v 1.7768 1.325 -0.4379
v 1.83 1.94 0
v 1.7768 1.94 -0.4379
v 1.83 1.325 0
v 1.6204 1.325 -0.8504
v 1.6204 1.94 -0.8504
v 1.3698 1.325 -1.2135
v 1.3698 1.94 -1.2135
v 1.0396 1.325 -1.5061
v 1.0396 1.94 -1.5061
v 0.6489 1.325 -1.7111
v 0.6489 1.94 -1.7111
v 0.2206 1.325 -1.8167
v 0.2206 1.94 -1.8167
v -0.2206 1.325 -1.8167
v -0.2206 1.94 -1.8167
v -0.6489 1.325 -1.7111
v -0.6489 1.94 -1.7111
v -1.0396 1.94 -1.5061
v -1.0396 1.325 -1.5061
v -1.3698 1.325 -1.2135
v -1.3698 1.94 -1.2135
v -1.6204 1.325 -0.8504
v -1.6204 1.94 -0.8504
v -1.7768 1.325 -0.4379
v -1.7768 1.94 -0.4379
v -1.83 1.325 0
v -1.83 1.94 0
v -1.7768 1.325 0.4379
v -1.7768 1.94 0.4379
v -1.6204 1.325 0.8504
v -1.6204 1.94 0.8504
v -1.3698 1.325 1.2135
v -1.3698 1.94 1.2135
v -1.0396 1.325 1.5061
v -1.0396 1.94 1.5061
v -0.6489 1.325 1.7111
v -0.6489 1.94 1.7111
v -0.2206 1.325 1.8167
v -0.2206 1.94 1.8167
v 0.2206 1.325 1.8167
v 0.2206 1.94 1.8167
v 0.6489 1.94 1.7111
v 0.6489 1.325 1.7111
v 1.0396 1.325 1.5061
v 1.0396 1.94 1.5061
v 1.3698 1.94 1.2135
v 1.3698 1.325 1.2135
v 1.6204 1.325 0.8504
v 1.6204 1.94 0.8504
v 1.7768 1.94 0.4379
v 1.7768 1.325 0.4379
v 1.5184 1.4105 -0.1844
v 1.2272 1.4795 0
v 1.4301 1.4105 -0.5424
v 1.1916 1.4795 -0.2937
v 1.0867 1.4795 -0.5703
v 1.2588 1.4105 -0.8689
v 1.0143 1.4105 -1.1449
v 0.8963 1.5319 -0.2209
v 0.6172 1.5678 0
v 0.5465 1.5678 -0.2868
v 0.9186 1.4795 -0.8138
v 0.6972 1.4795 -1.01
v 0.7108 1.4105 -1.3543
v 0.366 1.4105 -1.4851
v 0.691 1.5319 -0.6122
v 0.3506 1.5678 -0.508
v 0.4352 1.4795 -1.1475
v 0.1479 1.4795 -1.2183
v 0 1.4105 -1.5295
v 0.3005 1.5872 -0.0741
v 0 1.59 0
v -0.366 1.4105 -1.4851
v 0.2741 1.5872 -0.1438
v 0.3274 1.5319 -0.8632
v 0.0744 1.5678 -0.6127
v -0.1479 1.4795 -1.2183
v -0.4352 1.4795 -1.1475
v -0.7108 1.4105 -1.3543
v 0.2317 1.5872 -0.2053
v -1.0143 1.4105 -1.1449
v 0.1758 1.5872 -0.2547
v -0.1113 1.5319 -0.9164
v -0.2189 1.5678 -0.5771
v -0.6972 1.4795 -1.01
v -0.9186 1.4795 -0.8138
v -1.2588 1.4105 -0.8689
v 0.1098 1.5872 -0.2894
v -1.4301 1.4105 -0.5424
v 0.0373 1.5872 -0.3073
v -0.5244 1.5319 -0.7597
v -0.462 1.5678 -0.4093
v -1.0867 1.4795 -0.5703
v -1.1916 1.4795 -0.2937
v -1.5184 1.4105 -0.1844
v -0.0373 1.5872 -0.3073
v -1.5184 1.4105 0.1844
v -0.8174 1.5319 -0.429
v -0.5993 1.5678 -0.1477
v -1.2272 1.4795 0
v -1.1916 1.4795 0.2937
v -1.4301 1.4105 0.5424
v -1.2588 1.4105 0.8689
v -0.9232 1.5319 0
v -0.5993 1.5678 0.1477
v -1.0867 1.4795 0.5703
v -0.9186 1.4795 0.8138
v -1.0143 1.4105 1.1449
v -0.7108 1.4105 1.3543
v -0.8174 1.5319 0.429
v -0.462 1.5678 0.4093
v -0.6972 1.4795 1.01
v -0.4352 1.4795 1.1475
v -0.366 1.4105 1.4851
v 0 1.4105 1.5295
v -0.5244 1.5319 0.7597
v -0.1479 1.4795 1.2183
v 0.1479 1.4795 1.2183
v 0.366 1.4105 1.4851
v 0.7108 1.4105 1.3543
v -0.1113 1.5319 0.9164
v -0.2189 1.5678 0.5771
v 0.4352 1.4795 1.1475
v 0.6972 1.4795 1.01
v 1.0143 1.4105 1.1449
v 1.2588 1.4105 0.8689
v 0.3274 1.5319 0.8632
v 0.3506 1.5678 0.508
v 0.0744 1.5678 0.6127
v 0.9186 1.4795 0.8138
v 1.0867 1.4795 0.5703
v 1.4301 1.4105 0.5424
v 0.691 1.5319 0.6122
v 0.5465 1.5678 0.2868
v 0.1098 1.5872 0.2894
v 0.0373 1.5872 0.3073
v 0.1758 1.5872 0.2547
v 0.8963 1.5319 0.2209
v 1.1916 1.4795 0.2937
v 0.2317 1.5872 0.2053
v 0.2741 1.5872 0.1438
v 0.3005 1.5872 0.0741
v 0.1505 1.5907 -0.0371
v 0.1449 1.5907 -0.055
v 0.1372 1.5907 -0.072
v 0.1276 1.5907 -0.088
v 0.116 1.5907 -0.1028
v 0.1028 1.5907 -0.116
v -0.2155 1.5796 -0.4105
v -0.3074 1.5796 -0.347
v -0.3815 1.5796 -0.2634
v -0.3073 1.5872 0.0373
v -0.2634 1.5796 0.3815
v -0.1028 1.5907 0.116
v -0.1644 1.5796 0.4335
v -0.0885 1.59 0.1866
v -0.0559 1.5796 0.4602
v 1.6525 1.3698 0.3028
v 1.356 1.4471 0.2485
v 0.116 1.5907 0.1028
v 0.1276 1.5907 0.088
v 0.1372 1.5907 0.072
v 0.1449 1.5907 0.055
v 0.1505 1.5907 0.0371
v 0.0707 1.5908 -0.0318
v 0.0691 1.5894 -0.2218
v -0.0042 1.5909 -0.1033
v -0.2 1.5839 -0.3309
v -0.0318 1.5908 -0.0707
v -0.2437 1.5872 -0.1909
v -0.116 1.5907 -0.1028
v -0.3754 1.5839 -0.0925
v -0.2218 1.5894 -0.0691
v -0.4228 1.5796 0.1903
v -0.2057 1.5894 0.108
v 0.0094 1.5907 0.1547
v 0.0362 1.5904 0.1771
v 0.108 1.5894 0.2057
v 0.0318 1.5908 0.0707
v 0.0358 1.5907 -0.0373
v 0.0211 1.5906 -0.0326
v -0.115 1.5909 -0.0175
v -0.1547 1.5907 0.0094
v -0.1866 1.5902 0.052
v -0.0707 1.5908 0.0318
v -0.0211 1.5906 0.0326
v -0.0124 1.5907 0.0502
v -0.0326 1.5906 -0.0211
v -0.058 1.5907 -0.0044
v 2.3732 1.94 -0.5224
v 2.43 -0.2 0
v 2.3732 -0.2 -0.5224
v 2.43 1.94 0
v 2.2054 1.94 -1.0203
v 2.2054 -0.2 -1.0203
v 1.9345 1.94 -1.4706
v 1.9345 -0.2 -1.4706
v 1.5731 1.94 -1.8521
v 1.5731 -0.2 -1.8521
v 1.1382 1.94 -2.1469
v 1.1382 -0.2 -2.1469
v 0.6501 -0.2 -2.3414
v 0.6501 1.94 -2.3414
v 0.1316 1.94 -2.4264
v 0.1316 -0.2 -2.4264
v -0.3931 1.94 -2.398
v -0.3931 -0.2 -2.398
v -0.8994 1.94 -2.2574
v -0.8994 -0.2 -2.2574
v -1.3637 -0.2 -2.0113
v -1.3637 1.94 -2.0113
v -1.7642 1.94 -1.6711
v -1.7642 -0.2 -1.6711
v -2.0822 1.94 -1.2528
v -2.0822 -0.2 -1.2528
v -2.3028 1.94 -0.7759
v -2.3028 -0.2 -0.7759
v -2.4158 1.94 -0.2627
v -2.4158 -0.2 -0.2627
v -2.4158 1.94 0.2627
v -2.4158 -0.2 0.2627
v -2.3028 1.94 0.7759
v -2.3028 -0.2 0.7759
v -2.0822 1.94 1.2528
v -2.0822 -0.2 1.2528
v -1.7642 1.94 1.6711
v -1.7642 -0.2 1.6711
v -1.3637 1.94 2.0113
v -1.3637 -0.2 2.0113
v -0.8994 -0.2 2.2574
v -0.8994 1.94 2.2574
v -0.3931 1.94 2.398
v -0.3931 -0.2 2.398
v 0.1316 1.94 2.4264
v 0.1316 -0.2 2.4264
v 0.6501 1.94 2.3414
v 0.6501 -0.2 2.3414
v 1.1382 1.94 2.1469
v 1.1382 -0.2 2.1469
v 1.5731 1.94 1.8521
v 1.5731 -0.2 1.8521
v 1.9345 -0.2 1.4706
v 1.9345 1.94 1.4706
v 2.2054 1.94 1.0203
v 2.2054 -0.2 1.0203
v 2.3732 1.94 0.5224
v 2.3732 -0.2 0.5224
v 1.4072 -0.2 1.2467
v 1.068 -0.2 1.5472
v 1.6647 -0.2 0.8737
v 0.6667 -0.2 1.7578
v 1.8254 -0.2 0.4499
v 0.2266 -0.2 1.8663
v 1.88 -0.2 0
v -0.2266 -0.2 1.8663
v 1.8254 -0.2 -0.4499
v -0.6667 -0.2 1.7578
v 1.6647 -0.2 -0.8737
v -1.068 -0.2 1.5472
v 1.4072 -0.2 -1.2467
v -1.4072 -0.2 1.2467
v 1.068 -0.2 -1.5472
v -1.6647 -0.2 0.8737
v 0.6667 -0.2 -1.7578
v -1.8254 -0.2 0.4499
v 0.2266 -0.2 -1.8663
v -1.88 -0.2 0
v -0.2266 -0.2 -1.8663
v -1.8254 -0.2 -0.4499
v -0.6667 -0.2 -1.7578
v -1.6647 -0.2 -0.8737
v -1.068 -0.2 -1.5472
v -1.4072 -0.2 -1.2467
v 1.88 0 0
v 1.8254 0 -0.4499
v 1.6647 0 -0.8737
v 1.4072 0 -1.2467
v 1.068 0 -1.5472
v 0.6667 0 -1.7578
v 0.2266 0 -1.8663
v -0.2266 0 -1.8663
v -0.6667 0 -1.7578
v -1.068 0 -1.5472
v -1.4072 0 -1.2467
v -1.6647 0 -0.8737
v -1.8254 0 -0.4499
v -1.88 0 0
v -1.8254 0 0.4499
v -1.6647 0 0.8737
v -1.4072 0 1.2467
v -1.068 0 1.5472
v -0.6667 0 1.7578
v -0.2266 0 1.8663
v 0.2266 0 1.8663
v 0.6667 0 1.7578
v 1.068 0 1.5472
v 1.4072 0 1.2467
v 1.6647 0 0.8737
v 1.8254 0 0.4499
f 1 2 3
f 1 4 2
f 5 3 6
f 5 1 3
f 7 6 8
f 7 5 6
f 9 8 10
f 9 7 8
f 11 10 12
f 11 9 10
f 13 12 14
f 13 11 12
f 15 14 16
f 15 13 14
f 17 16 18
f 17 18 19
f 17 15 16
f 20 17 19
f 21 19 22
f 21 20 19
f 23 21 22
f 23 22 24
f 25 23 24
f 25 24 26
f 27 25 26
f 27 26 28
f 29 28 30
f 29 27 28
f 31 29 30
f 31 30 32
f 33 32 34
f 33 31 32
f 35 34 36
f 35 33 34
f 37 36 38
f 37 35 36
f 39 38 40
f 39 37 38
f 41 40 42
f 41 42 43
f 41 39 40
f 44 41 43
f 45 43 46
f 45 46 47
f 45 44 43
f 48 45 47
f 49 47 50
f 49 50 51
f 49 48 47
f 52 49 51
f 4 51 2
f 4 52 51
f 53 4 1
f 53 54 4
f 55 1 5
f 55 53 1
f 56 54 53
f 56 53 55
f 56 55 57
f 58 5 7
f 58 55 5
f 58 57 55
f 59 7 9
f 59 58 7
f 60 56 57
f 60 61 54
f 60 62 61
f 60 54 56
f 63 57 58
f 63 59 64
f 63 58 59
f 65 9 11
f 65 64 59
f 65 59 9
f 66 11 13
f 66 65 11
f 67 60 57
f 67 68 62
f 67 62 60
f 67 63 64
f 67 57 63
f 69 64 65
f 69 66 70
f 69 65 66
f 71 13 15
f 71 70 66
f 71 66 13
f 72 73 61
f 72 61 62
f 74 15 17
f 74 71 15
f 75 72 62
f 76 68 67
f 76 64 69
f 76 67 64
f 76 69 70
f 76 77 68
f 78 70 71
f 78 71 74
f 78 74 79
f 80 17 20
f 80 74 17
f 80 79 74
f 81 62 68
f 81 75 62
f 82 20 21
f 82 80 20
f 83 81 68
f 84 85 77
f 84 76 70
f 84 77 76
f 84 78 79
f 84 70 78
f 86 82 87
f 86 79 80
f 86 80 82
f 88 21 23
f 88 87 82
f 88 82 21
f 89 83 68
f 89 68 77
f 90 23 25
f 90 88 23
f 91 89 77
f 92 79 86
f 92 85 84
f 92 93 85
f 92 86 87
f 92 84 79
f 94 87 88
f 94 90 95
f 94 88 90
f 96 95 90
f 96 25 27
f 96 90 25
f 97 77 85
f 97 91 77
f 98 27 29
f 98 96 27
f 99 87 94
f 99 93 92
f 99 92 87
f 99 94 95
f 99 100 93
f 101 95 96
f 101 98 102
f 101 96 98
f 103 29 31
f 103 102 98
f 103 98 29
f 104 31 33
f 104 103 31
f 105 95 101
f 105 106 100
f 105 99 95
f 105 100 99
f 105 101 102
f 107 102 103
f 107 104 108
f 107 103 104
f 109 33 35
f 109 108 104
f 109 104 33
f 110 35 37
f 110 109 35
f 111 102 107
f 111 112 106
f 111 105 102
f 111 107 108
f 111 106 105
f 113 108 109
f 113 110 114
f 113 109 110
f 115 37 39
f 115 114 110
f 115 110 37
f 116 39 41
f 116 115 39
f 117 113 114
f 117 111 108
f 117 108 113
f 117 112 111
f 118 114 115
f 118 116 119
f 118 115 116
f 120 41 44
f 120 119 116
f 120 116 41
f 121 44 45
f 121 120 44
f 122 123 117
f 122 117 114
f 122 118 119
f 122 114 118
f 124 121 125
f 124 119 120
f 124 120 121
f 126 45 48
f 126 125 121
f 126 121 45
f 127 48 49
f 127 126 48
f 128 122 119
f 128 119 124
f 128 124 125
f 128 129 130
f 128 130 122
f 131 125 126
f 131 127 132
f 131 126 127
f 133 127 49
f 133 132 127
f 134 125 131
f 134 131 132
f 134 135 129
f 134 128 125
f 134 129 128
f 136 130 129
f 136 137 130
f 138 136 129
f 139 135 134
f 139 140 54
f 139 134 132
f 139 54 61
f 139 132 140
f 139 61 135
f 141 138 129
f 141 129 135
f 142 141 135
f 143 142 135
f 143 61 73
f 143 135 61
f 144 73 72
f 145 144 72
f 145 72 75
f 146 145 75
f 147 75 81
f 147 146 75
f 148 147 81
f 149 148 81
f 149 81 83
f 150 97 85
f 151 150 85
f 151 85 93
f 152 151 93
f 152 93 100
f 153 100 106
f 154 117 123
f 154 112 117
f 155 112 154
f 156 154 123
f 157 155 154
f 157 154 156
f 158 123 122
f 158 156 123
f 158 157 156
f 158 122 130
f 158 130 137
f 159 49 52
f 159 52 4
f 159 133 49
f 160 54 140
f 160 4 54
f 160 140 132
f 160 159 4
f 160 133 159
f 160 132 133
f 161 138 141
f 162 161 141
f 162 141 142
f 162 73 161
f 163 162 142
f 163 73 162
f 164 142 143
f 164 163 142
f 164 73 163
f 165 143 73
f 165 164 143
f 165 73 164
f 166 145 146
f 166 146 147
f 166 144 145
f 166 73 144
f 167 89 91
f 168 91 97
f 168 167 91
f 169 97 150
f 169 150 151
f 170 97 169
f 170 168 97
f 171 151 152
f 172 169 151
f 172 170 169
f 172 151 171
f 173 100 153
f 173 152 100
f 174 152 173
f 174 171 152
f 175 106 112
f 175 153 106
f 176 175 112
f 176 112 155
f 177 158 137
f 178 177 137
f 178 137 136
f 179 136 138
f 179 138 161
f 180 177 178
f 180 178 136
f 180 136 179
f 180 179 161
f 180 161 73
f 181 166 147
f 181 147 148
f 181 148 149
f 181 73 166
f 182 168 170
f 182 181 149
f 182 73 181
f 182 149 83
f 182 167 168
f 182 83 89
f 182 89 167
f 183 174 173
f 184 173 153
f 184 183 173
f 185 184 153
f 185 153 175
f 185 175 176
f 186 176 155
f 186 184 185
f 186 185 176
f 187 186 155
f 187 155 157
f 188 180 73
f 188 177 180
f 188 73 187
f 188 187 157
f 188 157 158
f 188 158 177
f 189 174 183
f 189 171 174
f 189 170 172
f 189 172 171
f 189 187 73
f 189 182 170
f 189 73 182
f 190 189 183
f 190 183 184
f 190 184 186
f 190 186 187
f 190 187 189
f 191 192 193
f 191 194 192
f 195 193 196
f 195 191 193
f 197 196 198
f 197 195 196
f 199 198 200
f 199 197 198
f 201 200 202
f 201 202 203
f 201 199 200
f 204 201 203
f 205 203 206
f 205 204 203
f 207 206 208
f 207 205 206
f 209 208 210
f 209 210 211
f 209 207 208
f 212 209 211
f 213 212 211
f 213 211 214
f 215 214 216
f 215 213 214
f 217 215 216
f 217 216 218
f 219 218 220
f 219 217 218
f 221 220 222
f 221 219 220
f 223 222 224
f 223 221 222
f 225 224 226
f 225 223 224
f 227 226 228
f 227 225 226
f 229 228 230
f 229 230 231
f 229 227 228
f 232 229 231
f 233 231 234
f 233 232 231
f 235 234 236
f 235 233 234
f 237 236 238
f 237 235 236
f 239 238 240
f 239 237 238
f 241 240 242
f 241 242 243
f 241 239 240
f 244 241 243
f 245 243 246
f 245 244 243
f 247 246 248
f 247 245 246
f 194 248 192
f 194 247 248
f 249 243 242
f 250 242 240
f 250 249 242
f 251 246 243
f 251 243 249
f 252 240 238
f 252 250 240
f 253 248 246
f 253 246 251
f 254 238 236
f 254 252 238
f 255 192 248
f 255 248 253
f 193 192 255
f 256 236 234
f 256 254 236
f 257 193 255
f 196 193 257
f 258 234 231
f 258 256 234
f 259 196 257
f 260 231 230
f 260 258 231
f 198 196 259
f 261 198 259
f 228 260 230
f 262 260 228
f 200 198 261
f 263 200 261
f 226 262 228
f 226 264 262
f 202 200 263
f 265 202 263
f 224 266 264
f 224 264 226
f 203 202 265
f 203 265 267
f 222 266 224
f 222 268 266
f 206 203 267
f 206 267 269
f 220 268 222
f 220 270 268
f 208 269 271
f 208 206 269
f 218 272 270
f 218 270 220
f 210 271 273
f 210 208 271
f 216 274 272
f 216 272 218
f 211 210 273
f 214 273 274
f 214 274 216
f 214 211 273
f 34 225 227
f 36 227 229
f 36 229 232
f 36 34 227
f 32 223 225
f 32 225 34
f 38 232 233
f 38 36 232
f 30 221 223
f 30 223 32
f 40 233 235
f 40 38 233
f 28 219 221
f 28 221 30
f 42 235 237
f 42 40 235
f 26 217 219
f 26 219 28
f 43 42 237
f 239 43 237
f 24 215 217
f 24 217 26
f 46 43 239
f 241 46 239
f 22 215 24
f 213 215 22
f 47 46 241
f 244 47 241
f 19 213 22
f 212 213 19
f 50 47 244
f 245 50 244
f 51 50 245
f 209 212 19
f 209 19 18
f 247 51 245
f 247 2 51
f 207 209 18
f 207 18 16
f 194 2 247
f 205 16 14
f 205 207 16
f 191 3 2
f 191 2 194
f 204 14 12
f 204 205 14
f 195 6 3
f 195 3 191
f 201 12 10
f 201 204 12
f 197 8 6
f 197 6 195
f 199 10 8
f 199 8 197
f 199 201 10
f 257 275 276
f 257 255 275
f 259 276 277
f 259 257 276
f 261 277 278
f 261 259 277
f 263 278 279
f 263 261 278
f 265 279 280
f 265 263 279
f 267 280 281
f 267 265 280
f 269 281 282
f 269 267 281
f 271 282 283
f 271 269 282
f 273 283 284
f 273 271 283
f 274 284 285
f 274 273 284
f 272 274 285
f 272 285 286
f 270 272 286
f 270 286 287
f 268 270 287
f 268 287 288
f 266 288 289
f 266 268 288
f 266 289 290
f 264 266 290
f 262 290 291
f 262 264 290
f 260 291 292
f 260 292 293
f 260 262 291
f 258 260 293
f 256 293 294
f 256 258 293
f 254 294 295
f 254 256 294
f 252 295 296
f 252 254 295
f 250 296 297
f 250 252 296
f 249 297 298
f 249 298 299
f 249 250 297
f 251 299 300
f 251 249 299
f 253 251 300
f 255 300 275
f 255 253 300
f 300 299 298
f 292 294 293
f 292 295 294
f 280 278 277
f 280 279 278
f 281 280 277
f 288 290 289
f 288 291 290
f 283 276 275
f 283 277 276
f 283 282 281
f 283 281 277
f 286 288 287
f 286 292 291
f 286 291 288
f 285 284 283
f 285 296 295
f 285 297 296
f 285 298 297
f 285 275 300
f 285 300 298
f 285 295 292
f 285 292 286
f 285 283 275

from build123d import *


with BuildPart() as part:
    # Sketch1 → Revolve1 (revolve)
    with BuildSketch(Plane.XY):
        with BuildLine():
            Line((0, 0), (1.88, 0))
            Line((1.88, 0), (1.88, -0.2))
            Line((1.88, -0.2), (2.43, -0.2))
            Line((2.43, -0.2), (2.43, 1.94))
            Line((2.43, 1.94), (1.83, 1.94))
            Line((1.83, 1.94), (1.83, 1.325012736))
            add(Edge.make_bspline(
                [(1.83, 1.325012736), (0.931309896, 1.606367381), (0, 1.59)],
                knots=[0, 0, 0, 1, 1, 1], degree=2))
            Line((0, 1.59), (0, 0))
        make_face()
    revolve(axis=Axis((0, 0, 0), (0, 1, 0)))


solid = part.part
